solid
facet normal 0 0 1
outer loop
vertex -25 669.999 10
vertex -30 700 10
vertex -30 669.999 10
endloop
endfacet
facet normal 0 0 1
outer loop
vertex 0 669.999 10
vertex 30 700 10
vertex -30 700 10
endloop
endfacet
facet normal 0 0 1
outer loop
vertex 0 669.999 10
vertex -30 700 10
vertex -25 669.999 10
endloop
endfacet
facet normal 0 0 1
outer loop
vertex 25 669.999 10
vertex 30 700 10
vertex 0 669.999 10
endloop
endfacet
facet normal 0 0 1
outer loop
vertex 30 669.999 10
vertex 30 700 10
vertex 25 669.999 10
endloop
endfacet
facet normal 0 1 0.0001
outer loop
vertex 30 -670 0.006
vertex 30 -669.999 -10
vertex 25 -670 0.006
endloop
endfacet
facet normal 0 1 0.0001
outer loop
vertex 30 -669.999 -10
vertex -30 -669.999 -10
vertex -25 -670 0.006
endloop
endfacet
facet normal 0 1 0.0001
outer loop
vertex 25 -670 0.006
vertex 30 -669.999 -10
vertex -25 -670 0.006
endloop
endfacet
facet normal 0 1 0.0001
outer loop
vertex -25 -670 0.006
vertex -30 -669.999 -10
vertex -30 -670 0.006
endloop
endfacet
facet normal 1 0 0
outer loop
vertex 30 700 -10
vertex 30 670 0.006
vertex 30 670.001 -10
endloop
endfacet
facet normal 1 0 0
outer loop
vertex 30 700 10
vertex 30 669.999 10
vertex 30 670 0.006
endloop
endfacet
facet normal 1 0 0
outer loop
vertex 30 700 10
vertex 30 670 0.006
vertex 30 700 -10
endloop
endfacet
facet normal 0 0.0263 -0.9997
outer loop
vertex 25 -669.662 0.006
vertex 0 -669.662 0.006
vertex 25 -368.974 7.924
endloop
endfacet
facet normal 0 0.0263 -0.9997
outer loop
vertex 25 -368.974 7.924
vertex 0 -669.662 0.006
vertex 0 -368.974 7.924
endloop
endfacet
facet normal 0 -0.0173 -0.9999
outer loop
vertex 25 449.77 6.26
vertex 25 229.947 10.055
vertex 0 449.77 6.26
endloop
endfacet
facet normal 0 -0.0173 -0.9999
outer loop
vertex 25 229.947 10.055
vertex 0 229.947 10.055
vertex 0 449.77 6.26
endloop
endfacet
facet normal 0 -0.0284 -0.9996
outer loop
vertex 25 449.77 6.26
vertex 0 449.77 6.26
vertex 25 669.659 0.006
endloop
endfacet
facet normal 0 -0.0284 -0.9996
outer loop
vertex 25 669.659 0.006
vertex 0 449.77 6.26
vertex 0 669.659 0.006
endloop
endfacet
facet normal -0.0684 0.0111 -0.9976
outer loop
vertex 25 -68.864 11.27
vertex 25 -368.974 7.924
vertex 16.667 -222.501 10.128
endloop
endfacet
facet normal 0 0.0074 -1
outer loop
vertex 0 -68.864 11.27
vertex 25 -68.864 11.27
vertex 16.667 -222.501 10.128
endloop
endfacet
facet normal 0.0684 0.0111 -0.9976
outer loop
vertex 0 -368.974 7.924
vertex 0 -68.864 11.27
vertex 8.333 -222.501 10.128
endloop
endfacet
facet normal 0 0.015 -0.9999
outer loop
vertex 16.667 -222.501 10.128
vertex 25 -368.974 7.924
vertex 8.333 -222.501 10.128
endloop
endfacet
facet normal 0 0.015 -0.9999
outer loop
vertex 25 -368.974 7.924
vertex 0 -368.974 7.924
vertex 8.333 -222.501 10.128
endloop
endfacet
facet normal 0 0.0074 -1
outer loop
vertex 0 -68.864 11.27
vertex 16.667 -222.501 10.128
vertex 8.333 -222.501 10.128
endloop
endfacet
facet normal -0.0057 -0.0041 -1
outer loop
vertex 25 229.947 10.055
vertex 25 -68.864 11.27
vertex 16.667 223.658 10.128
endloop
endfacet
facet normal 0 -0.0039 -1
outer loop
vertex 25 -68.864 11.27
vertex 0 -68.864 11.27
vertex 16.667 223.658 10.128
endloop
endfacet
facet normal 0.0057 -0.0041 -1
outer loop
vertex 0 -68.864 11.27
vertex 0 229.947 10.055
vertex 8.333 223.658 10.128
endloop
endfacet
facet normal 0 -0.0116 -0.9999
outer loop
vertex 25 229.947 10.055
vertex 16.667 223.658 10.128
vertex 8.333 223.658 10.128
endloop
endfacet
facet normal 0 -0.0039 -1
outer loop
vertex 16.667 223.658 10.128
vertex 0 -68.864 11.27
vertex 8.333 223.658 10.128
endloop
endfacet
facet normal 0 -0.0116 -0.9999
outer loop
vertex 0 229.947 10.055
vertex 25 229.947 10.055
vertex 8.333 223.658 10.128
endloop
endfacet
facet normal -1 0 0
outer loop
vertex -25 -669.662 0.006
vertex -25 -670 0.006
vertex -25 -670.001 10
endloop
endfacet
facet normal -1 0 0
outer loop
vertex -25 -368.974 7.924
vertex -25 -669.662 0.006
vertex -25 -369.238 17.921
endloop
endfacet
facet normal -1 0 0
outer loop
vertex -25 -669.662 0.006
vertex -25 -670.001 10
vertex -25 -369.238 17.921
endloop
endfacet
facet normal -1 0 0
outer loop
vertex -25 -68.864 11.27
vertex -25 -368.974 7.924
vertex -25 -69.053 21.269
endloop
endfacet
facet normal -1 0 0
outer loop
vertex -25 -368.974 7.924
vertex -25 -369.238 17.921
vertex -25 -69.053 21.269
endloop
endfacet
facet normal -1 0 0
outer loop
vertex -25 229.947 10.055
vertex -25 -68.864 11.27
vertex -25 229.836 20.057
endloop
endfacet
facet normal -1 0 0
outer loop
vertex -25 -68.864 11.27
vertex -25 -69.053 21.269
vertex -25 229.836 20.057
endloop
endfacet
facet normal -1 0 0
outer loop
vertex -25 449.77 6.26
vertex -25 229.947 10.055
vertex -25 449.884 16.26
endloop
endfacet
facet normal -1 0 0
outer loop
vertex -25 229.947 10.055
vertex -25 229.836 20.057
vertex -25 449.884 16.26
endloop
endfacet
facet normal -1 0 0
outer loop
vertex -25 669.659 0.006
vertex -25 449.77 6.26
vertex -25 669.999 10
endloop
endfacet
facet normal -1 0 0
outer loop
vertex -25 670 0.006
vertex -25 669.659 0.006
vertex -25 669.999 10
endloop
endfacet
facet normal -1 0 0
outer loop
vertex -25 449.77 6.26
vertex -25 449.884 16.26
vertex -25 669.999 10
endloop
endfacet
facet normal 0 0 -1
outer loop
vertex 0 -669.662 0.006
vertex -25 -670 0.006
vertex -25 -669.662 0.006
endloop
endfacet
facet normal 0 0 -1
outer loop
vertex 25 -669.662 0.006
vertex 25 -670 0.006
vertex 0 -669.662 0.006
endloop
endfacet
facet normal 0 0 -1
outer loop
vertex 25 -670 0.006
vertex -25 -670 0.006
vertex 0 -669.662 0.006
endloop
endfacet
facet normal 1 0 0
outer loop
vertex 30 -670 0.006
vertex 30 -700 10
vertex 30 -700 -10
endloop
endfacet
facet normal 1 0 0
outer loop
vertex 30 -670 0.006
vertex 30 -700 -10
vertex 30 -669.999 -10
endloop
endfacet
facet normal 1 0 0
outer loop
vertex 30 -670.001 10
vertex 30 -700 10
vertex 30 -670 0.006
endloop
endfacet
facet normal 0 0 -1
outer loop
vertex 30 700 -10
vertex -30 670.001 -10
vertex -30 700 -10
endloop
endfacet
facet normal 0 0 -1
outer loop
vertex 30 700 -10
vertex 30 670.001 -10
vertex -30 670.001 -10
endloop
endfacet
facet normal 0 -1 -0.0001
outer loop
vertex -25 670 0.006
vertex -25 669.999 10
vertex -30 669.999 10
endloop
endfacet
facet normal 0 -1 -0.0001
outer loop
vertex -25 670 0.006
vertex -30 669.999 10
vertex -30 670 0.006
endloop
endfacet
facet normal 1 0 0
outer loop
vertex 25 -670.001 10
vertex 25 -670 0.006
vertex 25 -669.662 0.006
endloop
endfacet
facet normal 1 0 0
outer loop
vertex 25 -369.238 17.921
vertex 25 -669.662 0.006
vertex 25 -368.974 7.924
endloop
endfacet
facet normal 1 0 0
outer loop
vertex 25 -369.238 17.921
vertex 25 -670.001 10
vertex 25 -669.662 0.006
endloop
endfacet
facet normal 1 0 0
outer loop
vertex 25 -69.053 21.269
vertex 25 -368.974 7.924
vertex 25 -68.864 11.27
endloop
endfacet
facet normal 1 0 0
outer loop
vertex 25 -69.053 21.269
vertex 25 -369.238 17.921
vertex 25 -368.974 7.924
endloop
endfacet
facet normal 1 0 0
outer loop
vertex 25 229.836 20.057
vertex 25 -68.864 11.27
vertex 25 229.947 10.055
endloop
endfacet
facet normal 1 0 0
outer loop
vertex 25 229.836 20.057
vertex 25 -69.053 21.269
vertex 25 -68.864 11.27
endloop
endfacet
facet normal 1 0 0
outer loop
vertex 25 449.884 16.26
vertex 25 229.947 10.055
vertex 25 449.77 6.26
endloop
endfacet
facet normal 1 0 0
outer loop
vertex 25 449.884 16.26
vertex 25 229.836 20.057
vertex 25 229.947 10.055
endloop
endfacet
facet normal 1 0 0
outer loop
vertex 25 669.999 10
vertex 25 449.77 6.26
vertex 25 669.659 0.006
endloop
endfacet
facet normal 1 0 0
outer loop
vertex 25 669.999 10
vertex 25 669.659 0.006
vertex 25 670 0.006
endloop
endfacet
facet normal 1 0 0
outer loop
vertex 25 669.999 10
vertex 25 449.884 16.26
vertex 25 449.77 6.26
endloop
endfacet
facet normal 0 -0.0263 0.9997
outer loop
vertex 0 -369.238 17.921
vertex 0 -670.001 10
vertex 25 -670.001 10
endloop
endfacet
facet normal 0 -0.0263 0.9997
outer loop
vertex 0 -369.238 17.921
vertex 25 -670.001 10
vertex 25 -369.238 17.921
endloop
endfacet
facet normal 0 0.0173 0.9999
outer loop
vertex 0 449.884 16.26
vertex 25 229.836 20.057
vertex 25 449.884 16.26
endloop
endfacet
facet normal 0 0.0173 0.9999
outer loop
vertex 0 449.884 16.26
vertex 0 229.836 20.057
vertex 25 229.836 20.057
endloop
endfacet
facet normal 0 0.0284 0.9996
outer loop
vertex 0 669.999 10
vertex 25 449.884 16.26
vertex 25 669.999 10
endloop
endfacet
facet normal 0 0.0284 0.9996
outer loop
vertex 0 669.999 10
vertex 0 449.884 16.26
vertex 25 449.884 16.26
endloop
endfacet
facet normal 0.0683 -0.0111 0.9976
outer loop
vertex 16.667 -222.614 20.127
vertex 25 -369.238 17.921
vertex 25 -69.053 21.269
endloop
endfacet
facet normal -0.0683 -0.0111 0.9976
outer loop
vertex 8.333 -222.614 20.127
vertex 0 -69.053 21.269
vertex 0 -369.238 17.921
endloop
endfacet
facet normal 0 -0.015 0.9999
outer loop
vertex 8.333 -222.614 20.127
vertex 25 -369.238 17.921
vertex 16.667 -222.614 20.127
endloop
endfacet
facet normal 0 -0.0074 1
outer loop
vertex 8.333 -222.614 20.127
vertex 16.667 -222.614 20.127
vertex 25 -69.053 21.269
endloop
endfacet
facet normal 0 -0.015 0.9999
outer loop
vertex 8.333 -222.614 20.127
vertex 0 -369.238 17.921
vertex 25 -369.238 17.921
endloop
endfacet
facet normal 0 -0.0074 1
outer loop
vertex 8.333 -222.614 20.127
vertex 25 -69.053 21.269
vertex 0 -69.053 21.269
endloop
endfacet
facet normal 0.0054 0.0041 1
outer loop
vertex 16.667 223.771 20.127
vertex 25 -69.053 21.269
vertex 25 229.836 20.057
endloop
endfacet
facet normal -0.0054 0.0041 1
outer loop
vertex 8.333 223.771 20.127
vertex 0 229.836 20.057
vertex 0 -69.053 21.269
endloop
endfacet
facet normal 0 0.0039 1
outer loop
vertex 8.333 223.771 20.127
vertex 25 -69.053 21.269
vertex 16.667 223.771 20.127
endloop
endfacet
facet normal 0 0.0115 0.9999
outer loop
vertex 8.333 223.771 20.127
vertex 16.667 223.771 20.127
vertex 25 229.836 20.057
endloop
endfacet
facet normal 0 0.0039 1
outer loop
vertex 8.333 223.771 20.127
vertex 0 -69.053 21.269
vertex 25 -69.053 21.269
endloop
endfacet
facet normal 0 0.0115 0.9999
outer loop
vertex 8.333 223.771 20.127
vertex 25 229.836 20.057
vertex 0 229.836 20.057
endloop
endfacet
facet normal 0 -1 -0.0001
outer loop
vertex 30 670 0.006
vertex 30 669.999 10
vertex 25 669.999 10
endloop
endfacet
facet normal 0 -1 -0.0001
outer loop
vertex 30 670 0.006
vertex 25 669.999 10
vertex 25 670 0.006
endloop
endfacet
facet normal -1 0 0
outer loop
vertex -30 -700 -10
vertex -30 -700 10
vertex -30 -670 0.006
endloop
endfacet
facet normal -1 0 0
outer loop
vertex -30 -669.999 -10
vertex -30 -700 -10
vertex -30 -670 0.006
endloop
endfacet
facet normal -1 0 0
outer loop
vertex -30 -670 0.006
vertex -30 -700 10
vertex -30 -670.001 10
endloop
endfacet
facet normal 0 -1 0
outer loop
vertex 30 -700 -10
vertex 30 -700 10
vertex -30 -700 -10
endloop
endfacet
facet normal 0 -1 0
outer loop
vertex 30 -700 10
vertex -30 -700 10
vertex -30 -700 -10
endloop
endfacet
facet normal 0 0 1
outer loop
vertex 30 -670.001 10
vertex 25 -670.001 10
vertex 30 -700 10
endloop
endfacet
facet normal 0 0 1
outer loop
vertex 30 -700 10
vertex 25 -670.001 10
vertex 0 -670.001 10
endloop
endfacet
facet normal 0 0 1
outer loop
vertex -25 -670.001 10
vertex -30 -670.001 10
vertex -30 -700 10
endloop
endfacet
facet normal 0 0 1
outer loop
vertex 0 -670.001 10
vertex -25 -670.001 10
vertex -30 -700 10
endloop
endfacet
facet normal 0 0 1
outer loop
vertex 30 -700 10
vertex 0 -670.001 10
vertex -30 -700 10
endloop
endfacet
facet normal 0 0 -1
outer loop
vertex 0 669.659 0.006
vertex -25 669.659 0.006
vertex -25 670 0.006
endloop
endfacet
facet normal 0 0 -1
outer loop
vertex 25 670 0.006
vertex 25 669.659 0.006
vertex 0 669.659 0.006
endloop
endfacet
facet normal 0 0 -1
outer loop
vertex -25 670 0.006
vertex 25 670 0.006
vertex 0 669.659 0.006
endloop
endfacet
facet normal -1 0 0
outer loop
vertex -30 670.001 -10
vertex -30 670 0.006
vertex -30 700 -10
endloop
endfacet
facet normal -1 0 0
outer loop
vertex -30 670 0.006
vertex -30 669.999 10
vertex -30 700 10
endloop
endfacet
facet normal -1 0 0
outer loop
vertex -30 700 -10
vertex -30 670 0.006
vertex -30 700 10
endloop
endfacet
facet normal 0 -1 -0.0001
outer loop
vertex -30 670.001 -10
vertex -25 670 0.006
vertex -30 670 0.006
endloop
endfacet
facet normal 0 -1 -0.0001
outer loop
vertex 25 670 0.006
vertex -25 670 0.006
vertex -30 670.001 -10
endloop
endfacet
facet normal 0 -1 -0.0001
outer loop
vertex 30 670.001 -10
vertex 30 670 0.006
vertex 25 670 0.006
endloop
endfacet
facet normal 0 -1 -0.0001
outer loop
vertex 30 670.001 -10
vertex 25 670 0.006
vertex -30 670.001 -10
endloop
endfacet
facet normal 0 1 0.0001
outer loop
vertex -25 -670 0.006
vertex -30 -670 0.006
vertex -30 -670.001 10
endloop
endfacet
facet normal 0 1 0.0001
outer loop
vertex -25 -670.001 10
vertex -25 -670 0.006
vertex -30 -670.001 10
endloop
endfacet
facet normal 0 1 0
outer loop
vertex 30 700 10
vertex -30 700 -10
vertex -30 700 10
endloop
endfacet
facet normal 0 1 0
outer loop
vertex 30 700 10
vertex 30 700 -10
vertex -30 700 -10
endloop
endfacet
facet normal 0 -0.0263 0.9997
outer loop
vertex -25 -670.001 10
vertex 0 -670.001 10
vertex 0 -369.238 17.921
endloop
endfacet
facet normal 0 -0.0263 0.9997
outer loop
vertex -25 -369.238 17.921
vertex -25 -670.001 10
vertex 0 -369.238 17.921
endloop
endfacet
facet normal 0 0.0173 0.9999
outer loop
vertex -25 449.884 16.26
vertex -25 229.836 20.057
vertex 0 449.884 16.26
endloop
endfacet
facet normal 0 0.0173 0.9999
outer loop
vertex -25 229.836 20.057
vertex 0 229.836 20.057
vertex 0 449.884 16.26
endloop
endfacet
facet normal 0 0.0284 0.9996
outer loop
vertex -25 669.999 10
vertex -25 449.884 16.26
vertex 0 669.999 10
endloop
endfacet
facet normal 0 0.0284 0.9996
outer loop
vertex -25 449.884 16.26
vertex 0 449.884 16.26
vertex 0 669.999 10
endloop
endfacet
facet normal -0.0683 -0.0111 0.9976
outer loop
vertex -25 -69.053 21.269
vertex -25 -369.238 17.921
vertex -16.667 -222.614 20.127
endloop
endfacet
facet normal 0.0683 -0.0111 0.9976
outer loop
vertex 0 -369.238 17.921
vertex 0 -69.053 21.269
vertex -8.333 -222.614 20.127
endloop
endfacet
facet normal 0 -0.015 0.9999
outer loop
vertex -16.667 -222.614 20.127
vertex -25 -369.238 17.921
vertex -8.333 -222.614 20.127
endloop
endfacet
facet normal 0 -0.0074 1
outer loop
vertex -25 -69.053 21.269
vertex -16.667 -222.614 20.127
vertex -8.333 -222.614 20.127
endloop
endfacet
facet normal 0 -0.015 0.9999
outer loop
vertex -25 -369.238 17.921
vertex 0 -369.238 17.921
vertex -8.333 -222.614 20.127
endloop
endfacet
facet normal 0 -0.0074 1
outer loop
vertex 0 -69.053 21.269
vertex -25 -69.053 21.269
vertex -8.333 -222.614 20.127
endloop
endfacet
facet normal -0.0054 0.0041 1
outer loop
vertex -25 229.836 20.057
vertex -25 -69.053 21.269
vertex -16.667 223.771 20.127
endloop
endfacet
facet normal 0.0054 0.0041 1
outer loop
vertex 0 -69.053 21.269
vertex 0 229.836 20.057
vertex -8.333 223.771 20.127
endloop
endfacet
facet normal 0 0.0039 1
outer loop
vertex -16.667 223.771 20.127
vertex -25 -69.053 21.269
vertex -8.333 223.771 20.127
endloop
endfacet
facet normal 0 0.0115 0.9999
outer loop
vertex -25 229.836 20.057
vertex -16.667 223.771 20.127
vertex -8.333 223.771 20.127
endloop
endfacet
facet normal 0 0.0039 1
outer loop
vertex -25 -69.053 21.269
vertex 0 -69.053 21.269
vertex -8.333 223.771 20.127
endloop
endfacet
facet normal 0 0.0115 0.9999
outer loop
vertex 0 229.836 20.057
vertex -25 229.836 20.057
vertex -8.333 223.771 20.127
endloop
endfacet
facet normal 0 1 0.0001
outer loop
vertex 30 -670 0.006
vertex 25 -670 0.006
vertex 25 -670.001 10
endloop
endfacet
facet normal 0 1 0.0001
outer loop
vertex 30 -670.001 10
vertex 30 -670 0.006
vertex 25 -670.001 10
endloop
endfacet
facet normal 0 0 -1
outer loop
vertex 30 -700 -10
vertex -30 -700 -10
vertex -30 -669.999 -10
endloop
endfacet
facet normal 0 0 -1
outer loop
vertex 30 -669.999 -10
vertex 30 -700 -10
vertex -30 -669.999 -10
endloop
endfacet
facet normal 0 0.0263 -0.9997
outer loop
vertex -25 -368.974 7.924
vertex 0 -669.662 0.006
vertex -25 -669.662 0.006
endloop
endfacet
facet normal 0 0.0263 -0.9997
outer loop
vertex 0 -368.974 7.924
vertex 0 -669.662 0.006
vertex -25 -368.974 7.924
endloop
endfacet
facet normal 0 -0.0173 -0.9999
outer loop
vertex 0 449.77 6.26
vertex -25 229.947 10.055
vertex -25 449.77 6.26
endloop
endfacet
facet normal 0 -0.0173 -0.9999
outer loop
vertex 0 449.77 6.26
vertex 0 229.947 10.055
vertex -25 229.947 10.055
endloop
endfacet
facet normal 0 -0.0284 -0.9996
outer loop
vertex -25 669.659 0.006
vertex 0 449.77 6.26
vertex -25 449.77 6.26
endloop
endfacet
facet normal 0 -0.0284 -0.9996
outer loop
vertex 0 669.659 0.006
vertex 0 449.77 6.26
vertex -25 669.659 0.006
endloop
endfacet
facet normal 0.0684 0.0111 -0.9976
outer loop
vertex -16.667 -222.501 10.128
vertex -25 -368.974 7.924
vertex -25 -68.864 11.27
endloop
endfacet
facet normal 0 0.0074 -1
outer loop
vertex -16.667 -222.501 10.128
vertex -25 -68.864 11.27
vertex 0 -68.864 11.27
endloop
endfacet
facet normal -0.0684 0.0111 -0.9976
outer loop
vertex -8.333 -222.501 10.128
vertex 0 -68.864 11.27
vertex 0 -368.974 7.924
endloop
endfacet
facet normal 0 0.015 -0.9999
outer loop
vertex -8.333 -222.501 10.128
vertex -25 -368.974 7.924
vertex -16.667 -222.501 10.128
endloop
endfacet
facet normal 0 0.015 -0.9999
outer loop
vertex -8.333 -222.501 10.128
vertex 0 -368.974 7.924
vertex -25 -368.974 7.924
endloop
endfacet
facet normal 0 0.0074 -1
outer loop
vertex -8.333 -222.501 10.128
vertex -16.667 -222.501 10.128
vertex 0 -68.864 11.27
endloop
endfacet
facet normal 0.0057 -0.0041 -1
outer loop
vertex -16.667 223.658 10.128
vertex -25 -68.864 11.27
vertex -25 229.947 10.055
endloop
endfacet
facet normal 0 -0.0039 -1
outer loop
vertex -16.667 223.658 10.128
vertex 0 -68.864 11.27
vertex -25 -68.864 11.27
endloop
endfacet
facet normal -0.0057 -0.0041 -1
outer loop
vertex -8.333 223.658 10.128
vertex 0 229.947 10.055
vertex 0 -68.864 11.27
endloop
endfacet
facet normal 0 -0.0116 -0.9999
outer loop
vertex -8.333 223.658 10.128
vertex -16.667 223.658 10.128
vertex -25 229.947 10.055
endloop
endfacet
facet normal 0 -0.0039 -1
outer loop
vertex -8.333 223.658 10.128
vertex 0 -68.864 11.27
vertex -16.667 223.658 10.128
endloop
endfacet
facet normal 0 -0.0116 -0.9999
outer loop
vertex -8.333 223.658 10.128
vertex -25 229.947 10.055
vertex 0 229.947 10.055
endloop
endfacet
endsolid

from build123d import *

# Parameters (mm, degrees)
F1_DEPTH = 25
F2_DEPTH = 30


with BuildPart() as f1:
    # F0 (on Right) → F1 (new body, symmetric)
    with BuildSketch(Plane.YZ):
        with BuildLine():
            Line((670.0000019844, 0.0057839585), (669.9991416782, 10))
            add(Edge.make_bspline(
                [(-670.0008632864, 10), (-221.8311803419, 25.190444721), (223.5680336059, 25.190444721), (669.9991416782, 10)],
                knots=[0, 0, 0, 0, 1340.0000049646, 1340.0000049646, 1340.0000049646, 1340.0000049646], degree=3))
            Line((-670.0008632864, 10), (-670.0000029738, 0.0057101232))
            Line((-670.0000029738, 0.0057101232), (-669.6621137639, 0.0057392089))
            add(Edge.make_bspline(
                [(-669.6621137639, 0.0057392089), (-221.7166102489, 15.1885855015), (223.4538922618, 15.1885412345), (669.6590744572, 0.0057839585)],
                knots=[0, 0, 0, 0, 1, 1, 1, 1], degree=3))
            Line((669.6590744572, 0.0057839585), (670.0000019844, 0.0057839585))
        make_face()
    extrude(amount=F1_DEPTH, both=True)

    # F0 (on Right) → F2 (join, symmetric)
    with BuildSketch(Plane.YZ):
        Polygon((-670.0000029738, 0.0057101232), (-670.0008632864, 10), (-699.9999998281, 10), (-699.9999998281, -10), (-669.9991416782, -10), align=None)
        Polygon((699.9999998281, -10), (699.9999998281, 10), (669.9991416782, 10), (670.0000019844, 0.0057839585), (670.0008632864, -10), align=None)
    extrude(amount=F2_DEPTH, both=True)


solid = f1.part
